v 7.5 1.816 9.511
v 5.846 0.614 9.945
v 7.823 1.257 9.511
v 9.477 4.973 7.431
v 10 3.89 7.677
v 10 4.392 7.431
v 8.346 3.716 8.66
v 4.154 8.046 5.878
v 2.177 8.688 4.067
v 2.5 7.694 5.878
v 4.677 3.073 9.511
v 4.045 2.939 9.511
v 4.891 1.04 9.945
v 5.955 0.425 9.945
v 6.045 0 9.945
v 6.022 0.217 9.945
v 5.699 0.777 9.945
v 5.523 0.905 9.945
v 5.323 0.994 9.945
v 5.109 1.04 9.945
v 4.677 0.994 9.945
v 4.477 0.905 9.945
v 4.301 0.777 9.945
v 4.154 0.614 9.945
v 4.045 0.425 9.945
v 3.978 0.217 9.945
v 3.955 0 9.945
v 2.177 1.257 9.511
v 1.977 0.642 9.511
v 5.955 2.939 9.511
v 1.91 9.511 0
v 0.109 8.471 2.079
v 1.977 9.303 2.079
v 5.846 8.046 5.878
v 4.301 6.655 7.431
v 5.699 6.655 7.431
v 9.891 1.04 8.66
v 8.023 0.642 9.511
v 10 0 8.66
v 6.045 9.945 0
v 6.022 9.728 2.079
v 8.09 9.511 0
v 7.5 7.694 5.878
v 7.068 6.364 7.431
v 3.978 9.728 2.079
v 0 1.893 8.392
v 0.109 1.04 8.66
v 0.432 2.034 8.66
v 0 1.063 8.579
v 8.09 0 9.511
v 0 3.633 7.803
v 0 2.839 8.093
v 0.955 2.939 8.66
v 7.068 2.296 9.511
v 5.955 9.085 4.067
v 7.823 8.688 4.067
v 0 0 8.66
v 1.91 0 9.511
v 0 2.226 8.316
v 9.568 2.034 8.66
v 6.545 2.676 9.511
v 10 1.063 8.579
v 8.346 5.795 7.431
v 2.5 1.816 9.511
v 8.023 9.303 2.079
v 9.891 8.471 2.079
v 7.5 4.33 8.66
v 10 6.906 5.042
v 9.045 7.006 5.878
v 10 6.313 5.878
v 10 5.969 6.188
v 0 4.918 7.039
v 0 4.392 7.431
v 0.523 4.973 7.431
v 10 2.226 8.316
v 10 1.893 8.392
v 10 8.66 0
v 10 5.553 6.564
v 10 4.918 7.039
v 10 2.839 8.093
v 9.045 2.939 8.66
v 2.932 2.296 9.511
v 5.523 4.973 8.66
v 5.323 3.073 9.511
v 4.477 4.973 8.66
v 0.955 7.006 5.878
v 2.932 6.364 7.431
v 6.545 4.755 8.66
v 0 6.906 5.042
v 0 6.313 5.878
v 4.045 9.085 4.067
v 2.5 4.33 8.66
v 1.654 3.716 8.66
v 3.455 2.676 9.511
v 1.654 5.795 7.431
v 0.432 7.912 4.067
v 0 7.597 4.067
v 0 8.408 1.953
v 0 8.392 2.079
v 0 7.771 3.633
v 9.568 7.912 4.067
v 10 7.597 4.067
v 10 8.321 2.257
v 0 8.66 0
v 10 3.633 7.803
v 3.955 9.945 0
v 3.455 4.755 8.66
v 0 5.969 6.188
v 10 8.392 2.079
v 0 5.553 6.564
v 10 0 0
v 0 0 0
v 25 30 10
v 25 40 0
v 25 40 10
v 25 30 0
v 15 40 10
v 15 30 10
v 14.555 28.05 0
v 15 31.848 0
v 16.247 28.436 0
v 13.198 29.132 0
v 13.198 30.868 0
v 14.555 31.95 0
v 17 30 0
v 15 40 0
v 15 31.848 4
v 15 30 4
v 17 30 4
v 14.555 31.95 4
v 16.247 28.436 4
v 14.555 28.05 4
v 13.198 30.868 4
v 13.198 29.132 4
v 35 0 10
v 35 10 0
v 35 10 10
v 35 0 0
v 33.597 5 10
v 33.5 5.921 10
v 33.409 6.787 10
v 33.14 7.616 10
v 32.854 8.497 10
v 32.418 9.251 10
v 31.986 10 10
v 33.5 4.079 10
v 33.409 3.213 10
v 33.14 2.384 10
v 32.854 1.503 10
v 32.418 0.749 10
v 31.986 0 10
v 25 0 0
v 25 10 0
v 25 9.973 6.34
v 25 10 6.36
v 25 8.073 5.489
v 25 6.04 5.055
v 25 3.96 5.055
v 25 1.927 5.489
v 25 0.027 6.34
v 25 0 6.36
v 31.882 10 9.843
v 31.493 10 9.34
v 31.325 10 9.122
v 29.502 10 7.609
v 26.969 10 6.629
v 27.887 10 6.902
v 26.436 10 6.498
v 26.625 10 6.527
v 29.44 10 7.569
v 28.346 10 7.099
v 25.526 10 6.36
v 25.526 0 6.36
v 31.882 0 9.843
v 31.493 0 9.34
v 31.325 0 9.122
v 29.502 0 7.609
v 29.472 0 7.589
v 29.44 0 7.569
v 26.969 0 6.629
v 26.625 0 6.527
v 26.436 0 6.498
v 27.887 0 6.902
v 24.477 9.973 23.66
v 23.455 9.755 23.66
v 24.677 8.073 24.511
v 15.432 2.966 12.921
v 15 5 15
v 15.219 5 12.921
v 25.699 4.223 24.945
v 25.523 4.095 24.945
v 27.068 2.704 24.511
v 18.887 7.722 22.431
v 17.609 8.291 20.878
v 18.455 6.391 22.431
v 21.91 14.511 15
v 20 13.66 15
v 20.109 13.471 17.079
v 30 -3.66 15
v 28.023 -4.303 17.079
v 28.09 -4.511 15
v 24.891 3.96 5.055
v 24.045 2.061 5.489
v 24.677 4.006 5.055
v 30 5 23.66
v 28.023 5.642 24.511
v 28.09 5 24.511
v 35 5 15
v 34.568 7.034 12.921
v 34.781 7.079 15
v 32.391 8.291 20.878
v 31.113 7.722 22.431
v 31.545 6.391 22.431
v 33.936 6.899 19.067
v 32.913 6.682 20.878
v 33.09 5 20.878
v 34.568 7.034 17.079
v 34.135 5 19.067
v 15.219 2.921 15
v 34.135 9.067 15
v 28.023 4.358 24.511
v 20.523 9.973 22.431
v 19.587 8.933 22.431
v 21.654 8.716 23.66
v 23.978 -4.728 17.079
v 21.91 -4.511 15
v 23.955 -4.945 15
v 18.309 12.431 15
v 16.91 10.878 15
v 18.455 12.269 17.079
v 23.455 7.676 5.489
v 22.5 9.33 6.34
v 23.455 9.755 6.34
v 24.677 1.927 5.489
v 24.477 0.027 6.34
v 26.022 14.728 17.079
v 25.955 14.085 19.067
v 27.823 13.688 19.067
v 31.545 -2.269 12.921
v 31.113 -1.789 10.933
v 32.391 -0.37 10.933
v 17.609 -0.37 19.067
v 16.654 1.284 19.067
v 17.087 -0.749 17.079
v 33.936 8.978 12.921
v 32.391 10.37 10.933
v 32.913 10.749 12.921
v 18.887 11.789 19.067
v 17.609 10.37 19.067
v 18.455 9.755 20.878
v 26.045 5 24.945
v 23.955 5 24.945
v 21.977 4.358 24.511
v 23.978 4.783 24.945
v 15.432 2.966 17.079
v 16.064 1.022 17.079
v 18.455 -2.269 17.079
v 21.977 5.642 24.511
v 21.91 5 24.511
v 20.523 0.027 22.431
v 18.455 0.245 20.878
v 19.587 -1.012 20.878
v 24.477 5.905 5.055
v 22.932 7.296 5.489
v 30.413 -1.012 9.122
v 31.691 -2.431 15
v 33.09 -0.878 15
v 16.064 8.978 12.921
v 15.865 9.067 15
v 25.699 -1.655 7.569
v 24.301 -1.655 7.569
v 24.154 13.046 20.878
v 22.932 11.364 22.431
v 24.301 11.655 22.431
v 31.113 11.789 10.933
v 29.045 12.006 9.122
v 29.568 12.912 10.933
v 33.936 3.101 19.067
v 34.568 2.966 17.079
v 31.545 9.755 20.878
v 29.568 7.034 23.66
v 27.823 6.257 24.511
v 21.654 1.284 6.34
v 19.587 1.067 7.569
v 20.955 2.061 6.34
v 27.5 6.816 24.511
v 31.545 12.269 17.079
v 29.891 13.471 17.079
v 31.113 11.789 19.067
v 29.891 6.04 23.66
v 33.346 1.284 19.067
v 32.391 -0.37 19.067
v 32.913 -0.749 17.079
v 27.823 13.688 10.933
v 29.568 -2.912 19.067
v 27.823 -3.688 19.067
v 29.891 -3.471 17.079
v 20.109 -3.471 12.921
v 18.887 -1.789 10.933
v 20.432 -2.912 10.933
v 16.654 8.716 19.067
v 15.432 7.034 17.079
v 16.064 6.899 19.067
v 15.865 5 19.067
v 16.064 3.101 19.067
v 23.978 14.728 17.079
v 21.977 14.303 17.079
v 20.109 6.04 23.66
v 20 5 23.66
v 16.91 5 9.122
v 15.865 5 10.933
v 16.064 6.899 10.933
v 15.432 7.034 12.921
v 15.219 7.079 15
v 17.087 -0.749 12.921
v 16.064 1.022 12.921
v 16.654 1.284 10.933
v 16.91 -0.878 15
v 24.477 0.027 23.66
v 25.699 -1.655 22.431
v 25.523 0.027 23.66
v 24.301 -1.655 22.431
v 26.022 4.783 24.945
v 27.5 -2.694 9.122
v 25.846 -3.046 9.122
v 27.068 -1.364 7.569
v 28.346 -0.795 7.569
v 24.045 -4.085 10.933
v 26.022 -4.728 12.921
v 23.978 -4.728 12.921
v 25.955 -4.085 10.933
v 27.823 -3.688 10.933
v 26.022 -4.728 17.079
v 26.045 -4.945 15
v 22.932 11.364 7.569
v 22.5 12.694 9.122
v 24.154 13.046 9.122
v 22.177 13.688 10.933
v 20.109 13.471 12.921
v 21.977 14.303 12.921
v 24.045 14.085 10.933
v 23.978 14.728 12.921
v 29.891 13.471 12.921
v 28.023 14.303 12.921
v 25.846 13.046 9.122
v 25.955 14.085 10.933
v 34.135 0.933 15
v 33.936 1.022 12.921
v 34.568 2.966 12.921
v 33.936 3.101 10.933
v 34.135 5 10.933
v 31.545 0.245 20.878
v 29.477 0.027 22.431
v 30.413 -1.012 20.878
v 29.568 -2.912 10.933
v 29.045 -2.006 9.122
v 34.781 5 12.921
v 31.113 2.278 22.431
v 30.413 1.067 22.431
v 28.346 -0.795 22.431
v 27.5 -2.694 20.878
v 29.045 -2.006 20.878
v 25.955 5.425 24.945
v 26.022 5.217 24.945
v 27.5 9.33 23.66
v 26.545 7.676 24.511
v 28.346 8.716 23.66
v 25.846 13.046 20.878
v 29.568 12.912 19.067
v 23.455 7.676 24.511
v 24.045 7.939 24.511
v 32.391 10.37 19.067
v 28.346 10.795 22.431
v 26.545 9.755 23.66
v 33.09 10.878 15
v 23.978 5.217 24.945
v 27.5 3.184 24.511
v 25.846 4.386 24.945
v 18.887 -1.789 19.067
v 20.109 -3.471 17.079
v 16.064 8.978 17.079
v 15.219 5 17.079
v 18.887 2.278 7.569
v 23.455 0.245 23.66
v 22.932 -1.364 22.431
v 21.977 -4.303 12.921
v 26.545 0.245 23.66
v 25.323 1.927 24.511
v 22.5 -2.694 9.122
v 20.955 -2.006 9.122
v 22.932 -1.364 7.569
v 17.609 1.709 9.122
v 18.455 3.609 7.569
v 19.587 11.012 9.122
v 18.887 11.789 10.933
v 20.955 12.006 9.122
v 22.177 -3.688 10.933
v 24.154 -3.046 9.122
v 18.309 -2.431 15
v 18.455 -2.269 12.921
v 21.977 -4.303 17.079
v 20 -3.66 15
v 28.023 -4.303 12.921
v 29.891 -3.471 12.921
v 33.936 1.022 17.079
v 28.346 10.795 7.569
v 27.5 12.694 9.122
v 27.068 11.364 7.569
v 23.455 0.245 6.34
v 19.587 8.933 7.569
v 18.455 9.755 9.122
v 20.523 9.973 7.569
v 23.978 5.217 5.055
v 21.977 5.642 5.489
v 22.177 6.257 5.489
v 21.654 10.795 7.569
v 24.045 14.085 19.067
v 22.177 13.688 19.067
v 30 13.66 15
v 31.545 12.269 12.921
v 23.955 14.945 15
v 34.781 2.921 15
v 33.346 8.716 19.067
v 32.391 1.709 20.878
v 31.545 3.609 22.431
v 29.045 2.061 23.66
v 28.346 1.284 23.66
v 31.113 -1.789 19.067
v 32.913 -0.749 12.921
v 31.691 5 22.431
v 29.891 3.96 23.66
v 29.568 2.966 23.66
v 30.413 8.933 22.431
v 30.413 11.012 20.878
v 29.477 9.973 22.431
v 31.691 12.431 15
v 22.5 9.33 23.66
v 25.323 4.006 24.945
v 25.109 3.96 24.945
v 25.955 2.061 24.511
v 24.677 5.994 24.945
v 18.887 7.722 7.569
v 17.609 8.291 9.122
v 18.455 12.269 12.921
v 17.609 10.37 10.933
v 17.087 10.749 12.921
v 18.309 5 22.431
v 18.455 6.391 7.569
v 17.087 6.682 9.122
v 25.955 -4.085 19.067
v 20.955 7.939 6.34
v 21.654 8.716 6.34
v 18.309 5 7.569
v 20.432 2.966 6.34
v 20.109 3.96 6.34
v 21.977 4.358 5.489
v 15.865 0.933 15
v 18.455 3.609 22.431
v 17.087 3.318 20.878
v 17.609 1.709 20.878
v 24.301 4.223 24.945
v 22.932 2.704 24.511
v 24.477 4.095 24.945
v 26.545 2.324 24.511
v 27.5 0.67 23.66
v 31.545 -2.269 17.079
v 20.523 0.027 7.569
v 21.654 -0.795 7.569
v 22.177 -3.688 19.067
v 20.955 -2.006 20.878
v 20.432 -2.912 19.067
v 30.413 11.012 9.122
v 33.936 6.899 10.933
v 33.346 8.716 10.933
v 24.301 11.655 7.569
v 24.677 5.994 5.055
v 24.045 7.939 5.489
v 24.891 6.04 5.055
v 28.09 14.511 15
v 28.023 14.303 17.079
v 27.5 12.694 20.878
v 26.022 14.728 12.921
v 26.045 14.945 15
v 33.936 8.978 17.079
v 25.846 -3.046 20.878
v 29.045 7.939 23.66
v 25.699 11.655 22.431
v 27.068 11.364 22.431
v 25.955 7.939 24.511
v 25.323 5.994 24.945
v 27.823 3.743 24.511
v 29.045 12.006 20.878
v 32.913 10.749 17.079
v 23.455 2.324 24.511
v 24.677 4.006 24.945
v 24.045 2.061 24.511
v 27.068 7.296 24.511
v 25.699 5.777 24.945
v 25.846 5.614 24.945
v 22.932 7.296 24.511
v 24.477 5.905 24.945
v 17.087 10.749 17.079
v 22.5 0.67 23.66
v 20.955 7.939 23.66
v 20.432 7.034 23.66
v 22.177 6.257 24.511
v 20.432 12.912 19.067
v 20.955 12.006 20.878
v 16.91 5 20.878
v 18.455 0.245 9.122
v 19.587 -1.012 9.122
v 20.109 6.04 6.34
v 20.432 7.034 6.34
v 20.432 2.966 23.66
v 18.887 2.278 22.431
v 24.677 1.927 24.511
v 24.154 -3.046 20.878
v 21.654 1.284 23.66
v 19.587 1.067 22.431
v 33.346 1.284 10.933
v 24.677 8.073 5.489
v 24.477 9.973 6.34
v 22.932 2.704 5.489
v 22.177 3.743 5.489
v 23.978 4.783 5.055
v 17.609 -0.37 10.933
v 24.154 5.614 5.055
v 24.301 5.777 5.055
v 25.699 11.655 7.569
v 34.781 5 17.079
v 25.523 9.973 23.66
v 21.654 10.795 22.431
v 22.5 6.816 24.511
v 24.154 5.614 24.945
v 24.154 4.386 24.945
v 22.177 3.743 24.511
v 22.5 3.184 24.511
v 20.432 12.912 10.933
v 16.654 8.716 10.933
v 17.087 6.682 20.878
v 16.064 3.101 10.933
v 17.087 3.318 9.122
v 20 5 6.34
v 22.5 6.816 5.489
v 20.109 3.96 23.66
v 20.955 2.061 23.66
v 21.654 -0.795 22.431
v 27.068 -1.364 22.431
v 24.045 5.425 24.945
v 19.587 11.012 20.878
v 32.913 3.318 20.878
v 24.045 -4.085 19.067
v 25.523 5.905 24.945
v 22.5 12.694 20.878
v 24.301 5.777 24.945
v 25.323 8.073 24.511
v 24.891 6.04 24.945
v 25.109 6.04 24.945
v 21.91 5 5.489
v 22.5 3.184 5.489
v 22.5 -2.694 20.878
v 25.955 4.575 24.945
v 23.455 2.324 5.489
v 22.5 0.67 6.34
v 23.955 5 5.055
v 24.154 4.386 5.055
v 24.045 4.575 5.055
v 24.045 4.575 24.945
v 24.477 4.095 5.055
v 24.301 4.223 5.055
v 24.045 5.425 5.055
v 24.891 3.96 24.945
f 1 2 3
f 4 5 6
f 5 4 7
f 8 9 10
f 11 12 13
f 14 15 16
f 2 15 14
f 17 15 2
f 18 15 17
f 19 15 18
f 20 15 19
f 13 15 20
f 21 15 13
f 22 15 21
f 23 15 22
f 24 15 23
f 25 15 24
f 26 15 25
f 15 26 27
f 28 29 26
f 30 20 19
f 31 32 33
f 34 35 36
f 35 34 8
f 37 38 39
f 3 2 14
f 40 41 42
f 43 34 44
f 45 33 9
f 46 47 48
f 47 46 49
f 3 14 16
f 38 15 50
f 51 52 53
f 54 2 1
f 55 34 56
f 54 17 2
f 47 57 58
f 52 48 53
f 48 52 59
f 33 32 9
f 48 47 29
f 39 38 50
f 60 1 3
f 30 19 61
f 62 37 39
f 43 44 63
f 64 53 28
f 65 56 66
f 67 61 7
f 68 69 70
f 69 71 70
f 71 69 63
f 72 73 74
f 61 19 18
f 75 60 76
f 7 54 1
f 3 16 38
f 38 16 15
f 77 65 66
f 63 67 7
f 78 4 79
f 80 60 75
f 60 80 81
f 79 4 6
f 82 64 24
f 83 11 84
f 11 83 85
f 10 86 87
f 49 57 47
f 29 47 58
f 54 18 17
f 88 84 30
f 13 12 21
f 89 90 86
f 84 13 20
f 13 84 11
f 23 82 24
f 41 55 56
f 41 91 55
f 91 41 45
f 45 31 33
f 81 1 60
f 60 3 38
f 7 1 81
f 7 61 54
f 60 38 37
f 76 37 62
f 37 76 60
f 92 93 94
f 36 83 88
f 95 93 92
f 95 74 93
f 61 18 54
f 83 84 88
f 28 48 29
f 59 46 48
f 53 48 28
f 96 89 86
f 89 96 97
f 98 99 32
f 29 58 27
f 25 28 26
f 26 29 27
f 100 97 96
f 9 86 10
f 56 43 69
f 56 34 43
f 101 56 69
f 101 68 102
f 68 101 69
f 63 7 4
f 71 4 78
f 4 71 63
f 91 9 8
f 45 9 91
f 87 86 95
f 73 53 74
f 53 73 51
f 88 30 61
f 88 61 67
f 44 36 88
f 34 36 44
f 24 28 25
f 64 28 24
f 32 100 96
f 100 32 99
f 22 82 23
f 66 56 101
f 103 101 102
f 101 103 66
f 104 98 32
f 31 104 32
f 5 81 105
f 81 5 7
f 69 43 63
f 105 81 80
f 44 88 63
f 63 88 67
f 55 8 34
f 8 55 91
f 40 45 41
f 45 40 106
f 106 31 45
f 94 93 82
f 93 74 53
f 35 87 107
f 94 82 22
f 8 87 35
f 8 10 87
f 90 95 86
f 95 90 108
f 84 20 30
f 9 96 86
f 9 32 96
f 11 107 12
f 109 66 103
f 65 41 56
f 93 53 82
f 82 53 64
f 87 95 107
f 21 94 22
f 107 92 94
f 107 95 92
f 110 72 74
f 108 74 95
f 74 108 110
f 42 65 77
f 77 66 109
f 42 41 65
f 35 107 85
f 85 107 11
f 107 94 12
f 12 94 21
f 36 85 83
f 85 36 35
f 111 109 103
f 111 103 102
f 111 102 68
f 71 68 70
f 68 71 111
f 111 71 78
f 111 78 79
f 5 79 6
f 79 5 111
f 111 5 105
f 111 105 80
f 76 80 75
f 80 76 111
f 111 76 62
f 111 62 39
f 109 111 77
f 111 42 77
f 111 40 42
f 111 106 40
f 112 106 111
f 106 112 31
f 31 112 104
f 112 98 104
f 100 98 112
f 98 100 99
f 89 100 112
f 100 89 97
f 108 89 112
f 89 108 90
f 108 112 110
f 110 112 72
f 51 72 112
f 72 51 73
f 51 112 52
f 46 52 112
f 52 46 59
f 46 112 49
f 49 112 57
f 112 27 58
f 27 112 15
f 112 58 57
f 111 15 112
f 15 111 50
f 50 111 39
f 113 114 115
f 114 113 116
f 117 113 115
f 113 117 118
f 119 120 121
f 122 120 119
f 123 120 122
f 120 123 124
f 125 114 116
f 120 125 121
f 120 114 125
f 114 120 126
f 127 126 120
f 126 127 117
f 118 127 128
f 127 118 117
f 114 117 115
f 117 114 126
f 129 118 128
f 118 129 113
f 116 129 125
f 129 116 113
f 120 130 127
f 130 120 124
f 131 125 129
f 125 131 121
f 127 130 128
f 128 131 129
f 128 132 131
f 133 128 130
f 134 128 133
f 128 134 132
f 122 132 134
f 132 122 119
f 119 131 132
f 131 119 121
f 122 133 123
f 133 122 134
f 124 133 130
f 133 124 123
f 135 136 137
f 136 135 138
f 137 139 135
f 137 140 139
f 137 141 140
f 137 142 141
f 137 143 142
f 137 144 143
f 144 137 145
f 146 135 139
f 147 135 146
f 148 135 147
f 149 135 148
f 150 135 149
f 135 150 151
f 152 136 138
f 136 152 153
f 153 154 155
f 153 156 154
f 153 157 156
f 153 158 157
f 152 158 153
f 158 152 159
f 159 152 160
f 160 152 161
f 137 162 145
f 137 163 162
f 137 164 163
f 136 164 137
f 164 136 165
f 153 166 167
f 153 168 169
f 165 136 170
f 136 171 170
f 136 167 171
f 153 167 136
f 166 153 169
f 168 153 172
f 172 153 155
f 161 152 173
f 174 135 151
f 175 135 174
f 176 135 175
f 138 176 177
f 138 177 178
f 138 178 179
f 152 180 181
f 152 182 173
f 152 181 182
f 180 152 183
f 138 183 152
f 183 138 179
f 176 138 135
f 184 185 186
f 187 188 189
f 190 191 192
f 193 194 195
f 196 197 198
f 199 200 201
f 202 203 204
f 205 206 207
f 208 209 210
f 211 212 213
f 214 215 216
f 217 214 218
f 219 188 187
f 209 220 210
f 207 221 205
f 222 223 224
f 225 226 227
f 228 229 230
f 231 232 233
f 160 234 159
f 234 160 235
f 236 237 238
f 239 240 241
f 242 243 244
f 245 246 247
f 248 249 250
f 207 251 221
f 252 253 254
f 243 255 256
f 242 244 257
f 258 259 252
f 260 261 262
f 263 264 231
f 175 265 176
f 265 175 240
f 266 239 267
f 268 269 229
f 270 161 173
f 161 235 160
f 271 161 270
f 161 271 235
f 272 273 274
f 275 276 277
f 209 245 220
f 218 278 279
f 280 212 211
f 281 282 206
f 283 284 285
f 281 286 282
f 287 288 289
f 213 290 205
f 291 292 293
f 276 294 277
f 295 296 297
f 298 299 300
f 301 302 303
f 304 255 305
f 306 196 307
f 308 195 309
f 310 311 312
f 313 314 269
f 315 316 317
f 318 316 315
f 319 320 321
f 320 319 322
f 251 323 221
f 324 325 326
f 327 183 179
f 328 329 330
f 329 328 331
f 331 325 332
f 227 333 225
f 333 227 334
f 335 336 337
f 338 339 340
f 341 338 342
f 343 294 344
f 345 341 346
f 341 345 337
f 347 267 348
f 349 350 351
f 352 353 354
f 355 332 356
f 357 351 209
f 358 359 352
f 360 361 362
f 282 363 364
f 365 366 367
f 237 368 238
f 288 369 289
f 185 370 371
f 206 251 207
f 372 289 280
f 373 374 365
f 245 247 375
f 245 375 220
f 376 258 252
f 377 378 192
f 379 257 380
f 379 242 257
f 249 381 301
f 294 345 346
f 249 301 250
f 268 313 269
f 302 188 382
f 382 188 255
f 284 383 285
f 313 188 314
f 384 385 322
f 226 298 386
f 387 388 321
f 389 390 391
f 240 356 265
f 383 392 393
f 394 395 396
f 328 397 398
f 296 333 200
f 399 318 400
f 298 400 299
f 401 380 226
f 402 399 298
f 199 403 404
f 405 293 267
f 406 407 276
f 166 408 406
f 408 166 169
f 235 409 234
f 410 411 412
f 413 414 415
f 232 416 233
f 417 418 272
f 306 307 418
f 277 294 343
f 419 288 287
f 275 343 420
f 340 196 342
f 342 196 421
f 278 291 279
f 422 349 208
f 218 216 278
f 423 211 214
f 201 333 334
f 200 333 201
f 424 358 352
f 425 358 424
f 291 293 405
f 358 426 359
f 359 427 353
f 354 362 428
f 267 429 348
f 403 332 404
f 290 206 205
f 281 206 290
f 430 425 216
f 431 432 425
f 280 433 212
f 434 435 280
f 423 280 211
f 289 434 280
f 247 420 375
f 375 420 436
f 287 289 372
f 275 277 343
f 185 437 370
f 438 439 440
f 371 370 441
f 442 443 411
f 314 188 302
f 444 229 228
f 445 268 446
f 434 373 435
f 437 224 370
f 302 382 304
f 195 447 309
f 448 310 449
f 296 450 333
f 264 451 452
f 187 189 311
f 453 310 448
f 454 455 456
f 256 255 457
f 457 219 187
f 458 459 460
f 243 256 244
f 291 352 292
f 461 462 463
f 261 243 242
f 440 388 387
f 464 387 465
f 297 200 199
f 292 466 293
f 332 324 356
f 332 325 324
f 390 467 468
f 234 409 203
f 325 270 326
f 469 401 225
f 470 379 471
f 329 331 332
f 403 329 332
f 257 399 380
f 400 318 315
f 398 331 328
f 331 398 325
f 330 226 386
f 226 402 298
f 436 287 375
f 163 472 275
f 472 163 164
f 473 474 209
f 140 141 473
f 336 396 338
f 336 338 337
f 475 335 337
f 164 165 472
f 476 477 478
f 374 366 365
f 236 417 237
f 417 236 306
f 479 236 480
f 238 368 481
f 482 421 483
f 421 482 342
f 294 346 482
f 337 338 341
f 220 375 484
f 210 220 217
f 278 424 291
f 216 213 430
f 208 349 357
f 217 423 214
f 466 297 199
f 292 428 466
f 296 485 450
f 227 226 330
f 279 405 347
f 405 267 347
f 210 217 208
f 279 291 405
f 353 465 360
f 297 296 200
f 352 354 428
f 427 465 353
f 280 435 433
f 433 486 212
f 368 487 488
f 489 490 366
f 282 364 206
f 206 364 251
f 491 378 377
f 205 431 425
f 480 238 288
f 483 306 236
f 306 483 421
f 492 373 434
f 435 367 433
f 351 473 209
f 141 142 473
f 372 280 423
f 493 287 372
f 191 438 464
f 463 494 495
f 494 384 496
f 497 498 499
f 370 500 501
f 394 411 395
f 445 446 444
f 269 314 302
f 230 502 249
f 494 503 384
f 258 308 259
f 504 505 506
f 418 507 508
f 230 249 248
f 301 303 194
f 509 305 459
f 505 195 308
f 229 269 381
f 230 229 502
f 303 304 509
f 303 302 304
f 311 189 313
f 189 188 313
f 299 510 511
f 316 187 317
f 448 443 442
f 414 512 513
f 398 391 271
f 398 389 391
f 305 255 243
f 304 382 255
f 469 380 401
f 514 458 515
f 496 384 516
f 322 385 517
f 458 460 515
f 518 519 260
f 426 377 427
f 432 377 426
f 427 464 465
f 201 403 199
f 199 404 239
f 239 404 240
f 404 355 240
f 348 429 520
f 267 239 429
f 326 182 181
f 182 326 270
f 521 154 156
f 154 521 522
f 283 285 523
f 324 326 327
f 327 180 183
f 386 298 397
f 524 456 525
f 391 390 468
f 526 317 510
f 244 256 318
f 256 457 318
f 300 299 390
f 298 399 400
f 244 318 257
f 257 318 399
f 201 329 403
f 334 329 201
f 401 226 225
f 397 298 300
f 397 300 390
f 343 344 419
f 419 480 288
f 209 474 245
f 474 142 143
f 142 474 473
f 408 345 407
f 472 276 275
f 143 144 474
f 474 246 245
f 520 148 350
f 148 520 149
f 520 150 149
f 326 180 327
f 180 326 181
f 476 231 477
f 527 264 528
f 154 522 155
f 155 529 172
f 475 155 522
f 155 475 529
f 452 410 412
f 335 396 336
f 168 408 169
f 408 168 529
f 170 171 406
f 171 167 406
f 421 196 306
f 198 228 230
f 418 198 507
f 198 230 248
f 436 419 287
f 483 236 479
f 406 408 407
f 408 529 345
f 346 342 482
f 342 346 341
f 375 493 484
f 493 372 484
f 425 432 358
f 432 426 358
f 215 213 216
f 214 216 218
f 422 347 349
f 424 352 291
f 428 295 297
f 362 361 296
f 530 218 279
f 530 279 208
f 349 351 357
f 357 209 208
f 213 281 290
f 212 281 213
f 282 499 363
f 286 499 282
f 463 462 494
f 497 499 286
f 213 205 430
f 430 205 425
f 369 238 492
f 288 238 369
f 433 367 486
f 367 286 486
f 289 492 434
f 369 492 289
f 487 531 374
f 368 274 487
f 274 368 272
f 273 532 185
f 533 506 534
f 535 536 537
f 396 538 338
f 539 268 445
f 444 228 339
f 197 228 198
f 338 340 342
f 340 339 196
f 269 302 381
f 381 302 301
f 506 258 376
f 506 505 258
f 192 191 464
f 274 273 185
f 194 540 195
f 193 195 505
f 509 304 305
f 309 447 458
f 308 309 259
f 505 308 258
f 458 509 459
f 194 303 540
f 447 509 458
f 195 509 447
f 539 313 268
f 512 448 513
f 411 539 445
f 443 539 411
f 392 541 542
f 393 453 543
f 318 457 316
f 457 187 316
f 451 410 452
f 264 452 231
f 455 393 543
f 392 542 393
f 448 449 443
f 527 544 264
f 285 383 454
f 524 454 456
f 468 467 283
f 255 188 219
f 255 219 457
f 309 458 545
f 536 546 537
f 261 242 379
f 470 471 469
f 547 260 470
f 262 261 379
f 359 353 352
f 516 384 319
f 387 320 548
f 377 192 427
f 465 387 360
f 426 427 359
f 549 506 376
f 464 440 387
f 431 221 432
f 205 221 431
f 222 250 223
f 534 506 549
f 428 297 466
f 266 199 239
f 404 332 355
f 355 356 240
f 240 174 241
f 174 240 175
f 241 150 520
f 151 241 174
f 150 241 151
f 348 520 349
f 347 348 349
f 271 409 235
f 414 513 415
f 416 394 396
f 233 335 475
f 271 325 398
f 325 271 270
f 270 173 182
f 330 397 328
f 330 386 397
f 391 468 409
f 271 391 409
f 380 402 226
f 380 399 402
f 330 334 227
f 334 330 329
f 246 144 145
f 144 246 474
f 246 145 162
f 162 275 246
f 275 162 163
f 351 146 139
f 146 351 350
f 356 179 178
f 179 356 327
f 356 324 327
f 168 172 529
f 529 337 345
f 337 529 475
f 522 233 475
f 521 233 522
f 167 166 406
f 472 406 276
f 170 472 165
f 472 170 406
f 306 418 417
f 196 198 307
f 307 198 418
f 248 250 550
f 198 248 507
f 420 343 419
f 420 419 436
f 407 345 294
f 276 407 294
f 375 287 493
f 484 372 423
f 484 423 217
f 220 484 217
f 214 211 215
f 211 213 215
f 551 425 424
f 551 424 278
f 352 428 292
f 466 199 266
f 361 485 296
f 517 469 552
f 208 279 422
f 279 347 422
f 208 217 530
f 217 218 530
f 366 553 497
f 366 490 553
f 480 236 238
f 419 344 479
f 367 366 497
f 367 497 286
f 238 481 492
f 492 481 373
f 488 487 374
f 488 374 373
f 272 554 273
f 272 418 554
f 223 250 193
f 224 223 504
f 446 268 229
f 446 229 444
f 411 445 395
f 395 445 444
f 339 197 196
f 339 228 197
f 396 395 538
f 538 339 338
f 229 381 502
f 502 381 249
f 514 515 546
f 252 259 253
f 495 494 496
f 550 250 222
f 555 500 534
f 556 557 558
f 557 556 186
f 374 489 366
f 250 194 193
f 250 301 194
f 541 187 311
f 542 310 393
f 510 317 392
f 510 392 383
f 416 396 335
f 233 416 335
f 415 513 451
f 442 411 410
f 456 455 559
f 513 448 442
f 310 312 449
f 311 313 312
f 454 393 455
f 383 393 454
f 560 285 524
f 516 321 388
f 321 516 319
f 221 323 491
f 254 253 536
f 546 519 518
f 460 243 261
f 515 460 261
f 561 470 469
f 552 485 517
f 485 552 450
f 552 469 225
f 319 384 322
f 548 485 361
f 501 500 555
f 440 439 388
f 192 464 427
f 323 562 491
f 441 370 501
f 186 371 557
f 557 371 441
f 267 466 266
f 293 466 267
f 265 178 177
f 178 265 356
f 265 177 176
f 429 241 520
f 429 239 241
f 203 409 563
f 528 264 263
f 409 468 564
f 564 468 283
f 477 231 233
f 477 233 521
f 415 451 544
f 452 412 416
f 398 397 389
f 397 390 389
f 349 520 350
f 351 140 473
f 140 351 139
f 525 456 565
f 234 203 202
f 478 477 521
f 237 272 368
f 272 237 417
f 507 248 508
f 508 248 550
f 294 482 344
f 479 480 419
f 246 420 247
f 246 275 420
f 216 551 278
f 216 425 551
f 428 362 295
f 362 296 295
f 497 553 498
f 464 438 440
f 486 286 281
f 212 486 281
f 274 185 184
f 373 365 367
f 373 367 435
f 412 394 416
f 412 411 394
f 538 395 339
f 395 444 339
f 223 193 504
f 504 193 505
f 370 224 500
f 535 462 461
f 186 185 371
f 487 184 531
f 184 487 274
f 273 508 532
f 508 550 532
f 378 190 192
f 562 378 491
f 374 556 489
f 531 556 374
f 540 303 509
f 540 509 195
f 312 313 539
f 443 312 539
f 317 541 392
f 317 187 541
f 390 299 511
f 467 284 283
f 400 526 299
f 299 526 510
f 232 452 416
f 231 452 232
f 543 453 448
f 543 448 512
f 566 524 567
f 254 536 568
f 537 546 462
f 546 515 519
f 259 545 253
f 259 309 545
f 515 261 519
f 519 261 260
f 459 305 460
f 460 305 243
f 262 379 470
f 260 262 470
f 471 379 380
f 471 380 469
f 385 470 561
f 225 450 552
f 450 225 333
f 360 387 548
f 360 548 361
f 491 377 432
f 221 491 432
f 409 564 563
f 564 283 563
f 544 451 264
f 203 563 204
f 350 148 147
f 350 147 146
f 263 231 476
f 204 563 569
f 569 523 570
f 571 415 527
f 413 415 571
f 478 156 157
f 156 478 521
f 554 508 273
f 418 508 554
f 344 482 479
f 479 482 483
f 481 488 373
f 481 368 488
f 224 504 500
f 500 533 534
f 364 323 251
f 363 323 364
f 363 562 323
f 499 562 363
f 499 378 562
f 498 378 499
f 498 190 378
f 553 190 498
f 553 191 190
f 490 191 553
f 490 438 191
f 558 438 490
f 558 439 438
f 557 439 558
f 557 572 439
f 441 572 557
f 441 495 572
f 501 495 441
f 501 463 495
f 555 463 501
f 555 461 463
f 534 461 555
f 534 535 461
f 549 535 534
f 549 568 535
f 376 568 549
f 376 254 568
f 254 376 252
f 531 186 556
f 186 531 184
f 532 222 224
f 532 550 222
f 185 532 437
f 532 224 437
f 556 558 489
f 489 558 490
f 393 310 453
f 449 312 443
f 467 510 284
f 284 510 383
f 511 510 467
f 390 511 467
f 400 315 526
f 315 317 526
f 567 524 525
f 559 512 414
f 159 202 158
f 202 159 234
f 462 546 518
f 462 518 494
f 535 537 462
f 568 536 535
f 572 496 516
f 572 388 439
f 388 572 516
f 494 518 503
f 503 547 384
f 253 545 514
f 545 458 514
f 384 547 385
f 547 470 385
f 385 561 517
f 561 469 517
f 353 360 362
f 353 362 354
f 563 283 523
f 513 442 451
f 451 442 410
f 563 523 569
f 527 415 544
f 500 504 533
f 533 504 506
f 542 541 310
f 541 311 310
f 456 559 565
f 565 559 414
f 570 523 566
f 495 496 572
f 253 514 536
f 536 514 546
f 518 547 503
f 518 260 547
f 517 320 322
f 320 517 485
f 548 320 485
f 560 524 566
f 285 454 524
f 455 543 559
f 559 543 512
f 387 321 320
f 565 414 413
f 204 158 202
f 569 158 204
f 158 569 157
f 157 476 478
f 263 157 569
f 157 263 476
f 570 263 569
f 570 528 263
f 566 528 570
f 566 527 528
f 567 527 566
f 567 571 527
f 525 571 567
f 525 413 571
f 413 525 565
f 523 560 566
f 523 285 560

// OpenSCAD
//default at position [0,0,0]
//left to right
Xpos = 15; //[-4:4]
// bottom to top
Zpos = 0; //[-16:4]

//default logo scaling [5]
logo_size = 5;

intersection(){
translate([5,0,0]){
color("salmon");
sphere(r=10, center=true);
}
scale([logo_size,logo_size,logo_size]){
cube(2);}
}
echo ("check");
union(){
translate([15,30,0]){
scale([5,5,5]){
color("red")
cube(2,2,2);
  }

 }
 translate([Xpos,30,Zpos]){
    cylinder(r=2, h=4);
  }
}
translate([25,0,0]){
scale([5,5,5]){
color("red")
cube(2,2,2);
  }
}

translate([25,5,15]){
color("red");
sphere(r=10, center=true);
}
